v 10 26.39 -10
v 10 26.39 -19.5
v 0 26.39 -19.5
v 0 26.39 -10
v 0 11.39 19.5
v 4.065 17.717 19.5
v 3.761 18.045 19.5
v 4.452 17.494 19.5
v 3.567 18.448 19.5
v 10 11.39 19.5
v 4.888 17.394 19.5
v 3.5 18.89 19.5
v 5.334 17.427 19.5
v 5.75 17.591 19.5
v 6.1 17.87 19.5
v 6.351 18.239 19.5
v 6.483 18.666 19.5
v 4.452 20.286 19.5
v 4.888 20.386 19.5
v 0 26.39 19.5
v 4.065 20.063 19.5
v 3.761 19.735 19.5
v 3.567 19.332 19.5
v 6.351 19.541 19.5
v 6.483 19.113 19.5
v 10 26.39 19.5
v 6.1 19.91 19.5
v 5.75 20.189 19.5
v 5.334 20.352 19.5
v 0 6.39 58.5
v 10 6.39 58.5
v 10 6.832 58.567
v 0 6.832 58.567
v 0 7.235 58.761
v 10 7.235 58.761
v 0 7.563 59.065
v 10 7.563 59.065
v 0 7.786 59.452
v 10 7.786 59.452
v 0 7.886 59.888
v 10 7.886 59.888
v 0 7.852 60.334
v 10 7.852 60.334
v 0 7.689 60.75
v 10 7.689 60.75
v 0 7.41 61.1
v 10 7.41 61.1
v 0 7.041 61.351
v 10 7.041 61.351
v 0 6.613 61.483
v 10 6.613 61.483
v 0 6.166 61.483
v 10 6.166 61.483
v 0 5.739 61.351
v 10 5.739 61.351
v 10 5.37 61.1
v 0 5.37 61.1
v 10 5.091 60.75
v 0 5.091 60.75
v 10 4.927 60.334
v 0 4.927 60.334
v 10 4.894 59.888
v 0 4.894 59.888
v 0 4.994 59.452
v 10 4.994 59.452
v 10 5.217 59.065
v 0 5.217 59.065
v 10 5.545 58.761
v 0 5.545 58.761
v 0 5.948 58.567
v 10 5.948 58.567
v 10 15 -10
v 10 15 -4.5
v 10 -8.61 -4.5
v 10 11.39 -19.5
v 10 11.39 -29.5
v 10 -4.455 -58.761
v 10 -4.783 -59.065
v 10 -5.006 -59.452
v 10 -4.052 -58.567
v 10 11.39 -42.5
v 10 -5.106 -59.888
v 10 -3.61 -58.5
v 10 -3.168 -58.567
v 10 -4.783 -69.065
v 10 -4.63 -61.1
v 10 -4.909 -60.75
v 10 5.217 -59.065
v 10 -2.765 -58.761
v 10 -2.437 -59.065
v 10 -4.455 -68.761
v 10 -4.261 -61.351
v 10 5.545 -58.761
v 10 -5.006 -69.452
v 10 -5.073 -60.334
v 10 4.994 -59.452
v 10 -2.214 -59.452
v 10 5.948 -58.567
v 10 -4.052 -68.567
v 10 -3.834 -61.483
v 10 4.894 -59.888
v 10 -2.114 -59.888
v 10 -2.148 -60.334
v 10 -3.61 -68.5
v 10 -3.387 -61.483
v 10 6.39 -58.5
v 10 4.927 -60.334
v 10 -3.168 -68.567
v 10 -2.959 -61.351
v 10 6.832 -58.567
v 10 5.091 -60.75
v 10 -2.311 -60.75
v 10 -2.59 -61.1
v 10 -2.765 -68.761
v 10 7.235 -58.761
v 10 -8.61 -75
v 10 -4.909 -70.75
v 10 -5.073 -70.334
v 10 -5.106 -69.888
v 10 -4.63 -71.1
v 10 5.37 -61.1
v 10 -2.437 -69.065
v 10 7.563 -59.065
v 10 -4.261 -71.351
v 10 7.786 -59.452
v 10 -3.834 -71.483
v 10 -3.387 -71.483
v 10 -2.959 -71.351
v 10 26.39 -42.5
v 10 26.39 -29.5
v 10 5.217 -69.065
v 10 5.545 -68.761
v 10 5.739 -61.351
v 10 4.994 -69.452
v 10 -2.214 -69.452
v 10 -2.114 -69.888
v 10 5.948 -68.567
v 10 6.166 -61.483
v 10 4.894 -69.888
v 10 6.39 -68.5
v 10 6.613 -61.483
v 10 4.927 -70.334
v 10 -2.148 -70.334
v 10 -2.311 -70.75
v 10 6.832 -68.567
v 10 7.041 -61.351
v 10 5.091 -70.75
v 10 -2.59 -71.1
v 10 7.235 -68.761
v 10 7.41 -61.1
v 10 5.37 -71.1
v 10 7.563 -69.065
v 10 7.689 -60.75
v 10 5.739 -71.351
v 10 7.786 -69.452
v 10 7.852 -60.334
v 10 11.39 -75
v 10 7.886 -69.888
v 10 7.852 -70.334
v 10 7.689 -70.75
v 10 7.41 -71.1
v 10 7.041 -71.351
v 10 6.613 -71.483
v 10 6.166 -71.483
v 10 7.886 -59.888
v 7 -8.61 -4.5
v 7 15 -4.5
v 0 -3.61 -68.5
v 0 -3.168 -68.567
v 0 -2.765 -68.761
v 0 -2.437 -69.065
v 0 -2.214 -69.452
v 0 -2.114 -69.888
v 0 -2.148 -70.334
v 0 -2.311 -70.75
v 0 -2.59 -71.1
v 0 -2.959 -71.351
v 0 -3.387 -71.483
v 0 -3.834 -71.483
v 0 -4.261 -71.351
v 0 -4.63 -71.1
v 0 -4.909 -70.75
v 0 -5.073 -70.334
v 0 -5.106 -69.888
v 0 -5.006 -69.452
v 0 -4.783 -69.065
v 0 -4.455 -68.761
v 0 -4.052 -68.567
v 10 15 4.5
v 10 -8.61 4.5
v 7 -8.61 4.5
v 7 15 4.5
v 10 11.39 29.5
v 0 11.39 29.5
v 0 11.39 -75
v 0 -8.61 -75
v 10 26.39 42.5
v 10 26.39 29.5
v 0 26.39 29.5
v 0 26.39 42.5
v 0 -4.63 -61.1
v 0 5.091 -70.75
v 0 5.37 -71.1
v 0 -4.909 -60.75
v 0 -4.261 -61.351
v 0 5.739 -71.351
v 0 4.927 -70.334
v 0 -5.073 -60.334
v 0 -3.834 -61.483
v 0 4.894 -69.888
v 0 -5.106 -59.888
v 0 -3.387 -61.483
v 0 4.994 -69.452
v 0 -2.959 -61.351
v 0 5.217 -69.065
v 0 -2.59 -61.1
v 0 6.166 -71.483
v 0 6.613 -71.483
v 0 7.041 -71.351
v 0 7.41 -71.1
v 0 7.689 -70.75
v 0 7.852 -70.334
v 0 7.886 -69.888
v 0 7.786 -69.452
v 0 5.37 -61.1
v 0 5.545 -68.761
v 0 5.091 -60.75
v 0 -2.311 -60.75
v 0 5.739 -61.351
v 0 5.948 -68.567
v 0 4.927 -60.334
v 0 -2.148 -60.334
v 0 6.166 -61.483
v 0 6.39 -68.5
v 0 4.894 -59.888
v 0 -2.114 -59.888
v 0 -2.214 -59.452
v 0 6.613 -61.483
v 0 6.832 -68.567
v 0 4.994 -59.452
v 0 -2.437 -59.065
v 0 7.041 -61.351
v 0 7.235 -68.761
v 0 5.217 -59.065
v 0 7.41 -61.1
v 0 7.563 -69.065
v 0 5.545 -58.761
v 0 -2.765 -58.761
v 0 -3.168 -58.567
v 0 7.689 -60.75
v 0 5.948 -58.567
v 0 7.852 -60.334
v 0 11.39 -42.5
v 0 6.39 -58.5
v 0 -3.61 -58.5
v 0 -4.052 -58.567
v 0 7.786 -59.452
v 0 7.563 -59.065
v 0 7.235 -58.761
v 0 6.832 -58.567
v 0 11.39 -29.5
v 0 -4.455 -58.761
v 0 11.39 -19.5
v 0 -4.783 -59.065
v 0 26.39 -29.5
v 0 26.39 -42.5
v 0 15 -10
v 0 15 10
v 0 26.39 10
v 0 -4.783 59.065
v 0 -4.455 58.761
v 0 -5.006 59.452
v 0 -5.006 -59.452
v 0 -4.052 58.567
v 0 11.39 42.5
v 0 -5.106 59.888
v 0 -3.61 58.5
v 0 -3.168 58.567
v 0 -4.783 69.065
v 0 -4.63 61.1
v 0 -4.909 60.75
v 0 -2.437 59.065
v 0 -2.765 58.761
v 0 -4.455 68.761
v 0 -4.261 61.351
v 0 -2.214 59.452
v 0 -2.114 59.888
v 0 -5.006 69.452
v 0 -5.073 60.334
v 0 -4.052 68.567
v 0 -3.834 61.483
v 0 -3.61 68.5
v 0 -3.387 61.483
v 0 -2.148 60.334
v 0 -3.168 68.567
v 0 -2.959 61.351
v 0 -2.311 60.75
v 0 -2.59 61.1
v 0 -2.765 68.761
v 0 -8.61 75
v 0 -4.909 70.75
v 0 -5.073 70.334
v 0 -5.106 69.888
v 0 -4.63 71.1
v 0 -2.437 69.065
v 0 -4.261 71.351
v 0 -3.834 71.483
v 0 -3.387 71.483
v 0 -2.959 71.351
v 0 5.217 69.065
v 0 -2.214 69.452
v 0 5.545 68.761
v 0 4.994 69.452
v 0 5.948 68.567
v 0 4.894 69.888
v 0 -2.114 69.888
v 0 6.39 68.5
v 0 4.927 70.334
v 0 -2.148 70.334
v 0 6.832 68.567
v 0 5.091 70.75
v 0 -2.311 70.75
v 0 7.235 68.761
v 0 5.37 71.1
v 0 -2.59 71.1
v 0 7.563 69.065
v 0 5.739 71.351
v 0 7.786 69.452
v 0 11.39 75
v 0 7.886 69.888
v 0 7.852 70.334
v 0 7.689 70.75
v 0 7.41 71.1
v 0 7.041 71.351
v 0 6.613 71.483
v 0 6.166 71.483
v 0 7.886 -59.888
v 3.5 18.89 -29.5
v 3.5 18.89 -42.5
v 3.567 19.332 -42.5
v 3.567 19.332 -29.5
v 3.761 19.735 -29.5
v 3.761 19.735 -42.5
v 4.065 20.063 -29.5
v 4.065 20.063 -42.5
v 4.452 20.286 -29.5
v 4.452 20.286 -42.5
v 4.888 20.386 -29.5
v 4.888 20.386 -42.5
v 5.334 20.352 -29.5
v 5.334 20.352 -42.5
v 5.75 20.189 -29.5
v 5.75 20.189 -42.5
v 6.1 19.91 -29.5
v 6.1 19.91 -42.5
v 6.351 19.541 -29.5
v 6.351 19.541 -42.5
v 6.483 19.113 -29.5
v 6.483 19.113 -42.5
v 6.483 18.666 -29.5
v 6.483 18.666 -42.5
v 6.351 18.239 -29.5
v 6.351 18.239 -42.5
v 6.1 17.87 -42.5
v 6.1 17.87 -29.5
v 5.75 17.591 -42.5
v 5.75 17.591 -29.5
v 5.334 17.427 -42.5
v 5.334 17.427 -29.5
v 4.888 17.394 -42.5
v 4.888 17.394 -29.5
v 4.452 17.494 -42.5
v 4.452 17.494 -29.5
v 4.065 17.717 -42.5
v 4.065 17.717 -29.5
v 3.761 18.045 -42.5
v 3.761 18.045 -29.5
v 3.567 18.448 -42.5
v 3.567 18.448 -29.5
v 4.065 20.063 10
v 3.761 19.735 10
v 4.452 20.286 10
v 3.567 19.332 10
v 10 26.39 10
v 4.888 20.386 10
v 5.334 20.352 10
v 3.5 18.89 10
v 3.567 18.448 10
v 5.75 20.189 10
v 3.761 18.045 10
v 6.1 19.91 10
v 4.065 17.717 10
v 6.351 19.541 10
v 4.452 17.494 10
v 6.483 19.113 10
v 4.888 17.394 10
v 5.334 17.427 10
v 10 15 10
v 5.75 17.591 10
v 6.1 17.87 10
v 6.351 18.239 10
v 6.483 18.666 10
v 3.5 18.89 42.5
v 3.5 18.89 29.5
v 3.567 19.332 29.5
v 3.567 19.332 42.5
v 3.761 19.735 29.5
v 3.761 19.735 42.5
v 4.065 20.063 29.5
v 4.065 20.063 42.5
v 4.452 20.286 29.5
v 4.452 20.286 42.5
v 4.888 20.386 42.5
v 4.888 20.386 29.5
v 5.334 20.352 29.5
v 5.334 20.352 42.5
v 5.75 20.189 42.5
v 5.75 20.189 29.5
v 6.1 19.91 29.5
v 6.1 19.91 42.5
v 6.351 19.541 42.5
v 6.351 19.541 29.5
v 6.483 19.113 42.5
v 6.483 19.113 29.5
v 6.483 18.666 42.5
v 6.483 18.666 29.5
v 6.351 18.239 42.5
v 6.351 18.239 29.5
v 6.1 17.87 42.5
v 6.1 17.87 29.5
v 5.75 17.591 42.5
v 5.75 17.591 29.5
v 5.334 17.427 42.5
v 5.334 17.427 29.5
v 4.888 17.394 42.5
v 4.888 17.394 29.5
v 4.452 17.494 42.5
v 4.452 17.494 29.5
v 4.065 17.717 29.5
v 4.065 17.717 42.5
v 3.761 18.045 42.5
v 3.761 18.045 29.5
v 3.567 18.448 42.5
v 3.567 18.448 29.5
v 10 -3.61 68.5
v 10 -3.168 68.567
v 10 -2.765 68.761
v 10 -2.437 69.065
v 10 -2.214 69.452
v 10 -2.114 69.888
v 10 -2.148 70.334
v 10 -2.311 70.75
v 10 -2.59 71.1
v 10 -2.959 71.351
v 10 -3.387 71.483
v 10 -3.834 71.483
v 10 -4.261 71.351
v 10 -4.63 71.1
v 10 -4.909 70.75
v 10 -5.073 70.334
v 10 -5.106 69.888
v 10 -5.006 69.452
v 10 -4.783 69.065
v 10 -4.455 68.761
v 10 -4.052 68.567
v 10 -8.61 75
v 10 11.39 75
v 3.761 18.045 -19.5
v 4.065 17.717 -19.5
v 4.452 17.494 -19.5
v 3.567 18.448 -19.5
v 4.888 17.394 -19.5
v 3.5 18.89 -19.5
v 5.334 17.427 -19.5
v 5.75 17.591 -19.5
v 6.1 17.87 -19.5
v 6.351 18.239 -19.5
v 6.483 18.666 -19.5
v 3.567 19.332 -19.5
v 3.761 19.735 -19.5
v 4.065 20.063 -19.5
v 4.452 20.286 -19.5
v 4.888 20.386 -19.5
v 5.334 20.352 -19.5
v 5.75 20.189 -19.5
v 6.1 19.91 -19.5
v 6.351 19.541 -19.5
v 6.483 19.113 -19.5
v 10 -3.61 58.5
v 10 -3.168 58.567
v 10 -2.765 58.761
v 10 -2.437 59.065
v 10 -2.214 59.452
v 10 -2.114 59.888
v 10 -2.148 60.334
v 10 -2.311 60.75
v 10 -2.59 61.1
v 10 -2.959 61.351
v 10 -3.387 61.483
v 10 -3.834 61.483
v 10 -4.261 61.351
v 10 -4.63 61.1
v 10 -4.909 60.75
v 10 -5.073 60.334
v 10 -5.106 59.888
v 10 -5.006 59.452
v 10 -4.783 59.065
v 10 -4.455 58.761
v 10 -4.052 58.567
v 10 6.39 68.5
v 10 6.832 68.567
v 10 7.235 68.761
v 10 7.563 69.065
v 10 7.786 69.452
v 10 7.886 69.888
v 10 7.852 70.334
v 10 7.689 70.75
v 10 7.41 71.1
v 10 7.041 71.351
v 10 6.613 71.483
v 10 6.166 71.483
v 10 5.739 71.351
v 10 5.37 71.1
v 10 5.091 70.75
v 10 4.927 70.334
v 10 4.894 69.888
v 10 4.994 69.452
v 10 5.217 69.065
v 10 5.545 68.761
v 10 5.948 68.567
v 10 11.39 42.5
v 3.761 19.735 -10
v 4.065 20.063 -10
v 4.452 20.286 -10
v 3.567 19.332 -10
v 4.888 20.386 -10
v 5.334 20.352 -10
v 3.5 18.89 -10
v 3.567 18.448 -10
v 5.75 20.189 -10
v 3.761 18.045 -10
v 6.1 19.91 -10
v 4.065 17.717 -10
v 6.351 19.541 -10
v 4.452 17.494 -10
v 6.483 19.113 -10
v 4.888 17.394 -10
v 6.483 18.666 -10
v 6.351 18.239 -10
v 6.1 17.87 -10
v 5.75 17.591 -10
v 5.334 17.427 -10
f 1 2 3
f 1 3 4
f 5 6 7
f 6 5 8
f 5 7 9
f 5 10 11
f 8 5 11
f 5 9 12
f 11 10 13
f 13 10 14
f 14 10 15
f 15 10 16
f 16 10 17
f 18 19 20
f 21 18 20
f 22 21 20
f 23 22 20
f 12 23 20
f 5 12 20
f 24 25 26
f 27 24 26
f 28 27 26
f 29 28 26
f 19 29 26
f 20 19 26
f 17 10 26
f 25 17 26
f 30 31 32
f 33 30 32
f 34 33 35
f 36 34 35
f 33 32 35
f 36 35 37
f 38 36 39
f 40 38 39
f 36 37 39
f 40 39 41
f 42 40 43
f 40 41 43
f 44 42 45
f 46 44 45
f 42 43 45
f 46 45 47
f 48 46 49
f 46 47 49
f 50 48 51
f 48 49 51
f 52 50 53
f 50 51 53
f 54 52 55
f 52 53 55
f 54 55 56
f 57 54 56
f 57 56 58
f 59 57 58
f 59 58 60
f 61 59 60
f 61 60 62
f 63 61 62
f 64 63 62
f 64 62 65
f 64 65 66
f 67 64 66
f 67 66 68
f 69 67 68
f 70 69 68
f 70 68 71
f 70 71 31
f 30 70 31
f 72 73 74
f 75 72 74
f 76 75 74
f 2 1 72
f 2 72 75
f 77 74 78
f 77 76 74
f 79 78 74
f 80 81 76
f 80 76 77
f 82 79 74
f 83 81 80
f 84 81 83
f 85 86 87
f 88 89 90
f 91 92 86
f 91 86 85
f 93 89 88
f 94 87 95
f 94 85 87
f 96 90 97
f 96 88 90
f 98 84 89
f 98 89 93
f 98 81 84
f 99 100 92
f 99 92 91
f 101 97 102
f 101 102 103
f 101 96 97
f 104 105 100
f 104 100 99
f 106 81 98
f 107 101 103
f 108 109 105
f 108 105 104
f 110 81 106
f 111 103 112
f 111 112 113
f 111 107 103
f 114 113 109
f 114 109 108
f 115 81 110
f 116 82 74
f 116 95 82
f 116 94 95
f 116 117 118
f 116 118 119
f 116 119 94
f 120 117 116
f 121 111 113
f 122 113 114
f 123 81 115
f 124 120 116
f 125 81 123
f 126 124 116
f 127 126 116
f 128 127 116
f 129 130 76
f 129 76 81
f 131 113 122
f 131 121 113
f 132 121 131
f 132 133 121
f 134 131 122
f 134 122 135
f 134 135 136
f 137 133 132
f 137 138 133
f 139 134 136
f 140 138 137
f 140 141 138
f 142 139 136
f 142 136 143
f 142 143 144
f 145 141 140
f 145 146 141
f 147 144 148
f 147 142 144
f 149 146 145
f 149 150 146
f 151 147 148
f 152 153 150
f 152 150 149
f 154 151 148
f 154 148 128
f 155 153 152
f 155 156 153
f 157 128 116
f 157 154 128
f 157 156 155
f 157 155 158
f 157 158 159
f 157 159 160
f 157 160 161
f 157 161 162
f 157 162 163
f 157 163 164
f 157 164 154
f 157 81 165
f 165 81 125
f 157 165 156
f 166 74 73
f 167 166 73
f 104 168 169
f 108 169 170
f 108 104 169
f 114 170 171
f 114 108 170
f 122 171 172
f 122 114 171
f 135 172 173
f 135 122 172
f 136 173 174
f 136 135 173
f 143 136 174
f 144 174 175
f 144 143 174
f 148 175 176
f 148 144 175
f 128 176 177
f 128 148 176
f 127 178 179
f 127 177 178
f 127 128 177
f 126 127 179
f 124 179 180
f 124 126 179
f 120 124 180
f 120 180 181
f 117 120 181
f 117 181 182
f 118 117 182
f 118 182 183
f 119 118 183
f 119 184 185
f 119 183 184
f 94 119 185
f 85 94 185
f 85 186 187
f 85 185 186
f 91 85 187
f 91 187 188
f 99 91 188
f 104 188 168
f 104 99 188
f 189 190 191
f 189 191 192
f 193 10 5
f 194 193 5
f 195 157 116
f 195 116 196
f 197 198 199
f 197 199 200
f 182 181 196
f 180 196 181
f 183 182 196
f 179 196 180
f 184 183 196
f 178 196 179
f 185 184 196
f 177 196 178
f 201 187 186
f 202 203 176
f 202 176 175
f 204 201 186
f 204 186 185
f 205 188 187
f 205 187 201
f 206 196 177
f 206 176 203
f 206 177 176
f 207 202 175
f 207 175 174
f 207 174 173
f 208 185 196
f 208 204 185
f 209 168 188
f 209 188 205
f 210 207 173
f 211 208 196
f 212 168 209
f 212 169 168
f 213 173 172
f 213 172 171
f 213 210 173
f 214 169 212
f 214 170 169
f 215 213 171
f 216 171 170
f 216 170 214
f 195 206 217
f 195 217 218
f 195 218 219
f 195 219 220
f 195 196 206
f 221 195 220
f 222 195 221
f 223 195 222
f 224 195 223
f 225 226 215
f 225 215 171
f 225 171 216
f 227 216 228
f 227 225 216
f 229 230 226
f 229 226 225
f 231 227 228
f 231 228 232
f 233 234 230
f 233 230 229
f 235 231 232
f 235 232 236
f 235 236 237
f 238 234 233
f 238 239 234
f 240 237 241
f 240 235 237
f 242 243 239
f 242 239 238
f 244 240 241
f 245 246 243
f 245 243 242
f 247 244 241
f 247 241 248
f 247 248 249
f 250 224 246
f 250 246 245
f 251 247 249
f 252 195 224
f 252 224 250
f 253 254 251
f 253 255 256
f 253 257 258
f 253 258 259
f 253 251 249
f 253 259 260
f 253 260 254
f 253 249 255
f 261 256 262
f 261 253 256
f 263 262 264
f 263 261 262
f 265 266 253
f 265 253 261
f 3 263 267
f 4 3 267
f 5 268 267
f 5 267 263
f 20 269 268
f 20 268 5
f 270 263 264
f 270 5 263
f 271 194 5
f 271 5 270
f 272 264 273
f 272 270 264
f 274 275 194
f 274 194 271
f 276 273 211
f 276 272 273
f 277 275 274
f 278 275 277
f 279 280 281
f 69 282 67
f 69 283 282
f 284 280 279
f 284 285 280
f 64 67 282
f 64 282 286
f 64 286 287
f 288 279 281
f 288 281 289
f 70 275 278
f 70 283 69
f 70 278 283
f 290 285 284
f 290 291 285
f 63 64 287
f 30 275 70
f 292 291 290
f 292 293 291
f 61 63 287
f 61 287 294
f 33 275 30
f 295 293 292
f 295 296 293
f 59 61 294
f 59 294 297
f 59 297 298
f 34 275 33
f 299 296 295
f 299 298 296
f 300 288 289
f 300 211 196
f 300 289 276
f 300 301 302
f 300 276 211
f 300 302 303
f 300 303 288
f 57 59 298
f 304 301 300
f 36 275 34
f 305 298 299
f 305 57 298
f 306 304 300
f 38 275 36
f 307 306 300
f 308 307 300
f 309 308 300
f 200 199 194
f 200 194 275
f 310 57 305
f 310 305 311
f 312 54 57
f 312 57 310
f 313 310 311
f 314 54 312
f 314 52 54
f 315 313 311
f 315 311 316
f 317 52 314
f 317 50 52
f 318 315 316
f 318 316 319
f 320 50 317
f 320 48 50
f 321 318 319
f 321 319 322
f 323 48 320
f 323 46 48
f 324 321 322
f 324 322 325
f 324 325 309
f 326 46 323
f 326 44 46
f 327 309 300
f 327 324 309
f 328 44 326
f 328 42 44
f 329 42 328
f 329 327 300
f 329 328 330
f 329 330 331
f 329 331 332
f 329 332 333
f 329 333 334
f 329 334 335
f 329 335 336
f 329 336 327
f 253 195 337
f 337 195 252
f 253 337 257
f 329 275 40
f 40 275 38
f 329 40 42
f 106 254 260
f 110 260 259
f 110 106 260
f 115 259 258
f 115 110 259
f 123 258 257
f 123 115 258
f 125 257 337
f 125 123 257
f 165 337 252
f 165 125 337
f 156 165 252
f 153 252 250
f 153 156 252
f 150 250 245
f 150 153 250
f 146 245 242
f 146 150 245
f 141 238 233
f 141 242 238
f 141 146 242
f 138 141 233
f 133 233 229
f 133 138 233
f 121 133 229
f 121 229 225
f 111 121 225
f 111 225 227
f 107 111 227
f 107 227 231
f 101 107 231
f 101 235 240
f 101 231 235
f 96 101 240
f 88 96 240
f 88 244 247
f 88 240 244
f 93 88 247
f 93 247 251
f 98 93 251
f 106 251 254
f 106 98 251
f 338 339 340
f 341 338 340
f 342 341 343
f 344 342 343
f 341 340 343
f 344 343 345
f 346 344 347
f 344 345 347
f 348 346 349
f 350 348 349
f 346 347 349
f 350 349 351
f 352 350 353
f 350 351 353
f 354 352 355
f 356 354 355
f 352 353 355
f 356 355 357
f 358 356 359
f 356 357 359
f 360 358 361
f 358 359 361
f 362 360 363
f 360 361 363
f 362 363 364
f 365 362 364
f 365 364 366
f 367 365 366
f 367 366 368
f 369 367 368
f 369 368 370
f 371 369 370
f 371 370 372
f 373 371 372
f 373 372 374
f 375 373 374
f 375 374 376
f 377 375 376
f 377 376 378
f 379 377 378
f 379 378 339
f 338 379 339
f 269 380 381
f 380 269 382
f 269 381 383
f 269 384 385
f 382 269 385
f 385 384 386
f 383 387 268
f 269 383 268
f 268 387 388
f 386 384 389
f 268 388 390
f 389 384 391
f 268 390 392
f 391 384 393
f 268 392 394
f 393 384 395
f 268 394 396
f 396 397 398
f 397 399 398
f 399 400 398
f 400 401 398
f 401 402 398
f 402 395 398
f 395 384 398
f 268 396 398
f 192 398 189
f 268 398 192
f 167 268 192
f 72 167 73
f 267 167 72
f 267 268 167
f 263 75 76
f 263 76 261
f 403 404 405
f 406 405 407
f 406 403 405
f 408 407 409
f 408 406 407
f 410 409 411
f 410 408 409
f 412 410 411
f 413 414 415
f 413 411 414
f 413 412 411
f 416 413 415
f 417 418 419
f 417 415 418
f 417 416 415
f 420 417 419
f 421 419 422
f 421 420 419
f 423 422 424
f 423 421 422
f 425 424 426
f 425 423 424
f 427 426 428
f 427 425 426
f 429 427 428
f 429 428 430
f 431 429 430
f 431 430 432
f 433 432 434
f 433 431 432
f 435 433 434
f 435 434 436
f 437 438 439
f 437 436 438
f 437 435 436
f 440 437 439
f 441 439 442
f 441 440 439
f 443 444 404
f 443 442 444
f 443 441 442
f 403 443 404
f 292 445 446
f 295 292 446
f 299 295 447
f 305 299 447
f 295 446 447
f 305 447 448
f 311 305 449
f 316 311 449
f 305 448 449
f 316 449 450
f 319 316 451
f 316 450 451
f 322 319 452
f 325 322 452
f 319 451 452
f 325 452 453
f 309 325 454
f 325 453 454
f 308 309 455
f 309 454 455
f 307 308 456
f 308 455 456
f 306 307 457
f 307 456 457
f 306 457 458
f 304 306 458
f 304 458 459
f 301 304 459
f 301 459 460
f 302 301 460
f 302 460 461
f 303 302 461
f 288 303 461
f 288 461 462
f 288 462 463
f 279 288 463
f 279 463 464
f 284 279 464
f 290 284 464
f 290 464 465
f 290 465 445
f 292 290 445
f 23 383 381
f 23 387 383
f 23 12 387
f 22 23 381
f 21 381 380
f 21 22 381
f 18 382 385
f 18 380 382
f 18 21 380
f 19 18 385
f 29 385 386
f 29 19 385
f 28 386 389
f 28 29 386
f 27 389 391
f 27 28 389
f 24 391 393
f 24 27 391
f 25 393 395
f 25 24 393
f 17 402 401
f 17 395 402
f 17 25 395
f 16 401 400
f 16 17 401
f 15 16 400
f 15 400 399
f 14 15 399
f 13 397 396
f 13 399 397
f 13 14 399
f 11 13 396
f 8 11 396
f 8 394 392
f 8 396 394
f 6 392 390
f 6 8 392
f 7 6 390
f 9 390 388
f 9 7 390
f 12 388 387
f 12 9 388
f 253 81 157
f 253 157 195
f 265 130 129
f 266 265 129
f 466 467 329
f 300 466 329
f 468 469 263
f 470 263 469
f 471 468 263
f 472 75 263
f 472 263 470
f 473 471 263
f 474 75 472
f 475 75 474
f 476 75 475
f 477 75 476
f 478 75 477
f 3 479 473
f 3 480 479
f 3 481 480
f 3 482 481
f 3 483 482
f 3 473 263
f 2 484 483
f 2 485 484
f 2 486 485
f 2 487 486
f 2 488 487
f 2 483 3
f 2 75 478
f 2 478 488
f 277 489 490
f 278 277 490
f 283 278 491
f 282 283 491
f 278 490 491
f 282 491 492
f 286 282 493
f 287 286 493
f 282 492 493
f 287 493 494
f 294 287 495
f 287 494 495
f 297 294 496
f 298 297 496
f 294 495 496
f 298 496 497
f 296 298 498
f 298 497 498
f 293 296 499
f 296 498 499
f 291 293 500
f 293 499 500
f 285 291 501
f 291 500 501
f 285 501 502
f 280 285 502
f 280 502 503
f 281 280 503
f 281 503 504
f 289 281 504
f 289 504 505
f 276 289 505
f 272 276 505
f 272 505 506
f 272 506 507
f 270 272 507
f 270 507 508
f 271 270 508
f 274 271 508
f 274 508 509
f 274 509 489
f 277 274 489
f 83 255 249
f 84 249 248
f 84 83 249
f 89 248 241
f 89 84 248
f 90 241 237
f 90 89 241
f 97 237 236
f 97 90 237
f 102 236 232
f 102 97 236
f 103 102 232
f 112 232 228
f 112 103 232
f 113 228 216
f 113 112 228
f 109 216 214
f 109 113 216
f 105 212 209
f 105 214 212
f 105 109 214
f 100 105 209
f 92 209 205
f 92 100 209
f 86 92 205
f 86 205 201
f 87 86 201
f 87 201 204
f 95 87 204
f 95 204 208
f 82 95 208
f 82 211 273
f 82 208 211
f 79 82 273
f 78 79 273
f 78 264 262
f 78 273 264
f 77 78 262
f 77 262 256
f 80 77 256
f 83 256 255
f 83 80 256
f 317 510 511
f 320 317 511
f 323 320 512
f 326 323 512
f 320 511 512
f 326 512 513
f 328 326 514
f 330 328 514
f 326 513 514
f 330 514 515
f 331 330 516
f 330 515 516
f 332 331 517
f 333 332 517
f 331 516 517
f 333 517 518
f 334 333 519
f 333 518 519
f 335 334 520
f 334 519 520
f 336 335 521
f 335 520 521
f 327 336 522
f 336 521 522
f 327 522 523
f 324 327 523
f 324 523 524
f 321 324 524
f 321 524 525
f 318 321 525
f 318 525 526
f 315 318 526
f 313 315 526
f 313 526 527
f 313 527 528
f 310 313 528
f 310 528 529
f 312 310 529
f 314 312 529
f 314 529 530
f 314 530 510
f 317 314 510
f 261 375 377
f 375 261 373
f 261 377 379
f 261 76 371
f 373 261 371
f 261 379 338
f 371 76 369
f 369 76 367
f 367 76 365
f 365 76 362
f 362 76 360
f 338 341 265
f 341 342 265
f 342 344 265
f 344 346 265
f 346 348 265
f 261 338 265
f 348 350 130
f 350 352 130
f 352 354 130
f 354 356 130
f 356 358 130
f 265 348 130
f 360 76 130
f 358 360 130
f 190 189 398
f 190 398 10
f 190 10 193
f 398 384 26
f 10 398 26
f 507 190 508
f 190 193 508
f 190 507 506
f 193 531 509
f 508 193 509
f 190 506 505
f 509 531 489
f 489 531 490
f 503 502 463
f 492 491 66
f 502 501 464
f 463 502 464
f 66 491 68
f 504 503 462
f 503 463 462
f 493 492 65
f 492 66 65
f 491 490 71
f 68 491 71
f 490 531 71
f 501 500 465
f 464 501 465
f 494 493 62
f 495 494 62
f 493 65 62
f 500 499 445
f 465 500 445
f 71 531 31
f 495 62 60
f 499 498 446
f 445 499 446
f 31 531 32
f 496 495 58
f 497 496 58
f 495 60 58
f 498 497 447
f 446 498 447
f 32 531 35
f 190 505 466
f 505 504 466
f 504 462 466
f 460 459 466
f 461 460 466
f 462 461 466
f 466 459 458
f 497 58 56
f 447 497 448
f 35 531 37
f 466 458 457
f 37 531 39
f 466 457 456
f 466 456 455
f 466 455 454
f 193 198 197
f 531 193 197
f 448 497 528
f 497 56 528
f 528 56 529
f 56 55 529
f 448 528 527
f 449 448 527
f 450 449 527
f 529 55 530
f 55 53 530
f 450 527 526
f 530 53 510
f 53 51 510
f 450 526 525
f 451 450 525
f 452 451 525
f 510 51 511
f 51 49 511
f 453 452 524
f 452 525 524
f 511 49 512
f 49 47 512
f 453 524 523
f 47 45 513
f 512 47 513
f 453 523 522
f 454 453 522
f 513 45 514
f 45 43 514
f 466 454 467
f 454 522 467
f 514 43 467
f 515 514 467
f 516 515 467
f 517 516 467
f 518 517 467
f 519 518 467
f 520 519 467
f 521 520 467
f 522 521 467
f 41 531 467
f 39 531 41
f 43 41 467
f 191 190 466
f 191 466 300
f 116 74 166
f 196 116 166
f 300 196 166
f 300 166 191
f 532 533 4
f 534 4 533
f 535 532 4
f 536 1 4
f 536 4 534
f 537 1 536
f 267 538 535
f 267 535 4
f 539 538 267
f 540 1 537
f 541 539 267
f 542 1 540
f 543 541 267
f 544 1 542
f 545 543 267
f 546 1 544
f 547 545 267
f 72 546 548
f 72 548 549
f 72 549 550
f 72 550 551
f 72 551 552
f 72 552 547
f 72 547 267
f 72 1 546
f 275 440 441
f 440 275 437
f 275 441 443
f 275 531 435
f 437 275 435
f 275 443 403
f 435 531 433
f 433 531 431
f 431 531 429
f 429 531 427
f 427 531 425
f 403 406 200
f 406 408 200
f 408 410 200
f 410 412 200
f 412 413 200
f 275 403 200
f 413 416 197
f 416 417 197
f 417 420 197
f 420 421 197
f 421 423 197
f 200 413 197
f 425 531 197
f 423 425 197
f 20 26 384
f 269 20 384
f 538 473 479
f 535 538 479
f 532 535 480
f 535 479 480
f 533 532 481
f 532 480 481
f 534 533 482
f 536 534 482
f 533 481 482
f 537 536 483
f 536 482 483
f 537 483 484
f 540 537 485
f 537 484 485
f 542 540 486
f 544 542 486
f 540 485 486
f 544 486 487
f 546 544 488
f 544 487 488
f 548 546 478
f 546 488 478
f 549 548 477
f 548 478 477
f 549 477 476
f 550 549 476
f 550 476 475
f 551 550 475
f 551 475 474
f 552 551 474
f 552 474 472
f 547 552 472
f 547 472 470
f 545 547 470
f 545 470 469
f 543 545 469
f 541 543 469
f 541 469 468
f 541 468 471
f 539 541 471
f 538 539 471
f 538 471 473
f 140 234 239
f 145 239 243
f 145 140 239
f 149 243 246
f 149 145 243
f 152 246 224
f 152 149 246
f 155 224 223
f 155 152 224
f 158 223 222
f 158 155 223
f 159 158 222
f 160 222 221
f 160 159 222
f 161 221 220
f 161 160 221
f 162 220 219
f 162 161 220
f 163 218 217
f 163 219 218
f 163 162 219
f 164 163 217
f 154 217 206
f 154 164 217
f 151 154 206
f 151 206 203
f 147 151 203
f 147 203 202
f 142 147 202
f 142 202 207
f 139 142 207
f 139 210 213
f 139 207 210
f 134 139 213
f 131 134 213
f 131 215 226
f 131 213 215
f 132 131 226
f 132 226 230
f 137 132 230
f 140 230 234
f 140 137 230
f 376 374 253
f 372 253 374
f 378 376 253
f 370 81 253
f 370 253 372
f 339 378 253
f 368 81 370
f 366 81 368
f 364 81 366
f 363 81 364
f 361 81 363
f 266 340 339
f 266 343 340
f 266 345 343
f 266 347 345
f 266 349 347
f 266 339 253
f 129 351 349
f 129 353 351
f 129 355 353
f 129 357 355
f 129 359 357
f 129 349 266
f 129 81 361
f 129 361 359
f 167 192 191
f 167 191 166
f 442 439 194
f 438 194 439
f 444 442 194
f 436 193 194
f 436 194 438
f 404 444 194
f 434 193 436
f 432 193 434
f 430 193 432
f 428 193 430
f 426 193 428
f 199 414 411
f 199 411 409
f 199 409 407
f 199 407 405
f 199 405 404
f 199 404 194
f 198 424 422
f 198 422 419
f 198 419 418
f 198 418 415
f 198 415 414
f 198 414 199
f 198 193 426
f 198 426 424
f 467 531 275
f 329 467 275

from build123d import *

# Parameters (mm, degrees)
SKETCH_1_W          = 20
SKETCH_1_H          = 30
EXTRUDE_1_DEPTH     = 10
SKETCH_3_W          = 10
SKETCH_3_H          = 20
EXTRUDE_2_DEPTH     = 65
SKETCH_4_R          = 1.5
CUT_EXTRUDE_1_DEPTH = 78.136243103
SKETCH_5_W          = 9
SKETCH_5_H          = 30
CUT_EXTRUDE_2_DEPTH = 3
SKETCH_6_W          = 13
SKETCH_6_H          = 15
EXTRUDE_3_DEPTH     = 10
SKETCH_7_R          = 1.5
CUT_EXTRUDE_5_DEPTH = 121.841532616
SKETCH_8_W          = 20
SKETCH_8_H          = 20
CUT_EXTRUDE_6_DEPTH = 6.389884519


with BuildPart() as part:
    # 草图1 → 凸台-拉伸1 (new body)
    with BuildSketch(Plane(origin=(0, 0, 0), x_dir=(0, 0, -1), z_dir=(1, 0, 0))):
        Rectangle(SKETCH_1_W, SKETCH_1_H)
    extrude(amount=EXTRUDE_1_DEPTH)

    # 草图3 → 凸台-拉伸2 (add)
    with BuildSketch(Plane(origin=(0, 0, -10), x_dir=(-1, 0, 0), z_dir=(0, 0, -1))):
        with Locations((-5, 1.389884519)):
            Rectangle(SKETCH_3_W, SKETCH_3_H)
    extrude_2 = extrude(amount=EXTRUDE_2_DEPTH)

    # 镜向1: 凸台-拉伸2 across plane
    add(extrude_2.mirror(Plane.XY))

    # 草图4 → 切除-拉伸1 (cut, through all)
    with BuildSketch(Plane(origin=(10, 0, 0), x_dir=(0, 0, -1), z_dir=(1, 0, 0))):
        with Locations((-70, 6.389884519)):
            Circle(SKETCH_4_R)
        with Locations((-60, 6.389884519)):
            Circle(SKETCH_4_R)
        with Locations((-70, -3.610115481)):
            Circle(SKETCH_4_R)
        with Locations((-60, -3.610115481)):
            Circle(SKETCH_4_R)
    cut_extrude_1 = extrude(amount=-CUT_EXTRUDE_1_DEPTH, mode=Mode.SUBTRACT)

    # 镜向2: 切除-拉伸1 across plane
    add(cut_extrude_1.mirror(Plane.XY), mode=Mode.SUBTRACT)

    # 草图5 → 切除-拉伸2 (cut)
    with BuildSketch(Plane(origin=(10, 0, 0), x_dir=(0, 0, -1), z_dir=(1, 0, 0))):
        Rectangle(SKETCH_5_W, SKETCH_5_H)
    extrude(amount=-CUT_EXTRUDE_2_DEPTH, mode=Mode.SUBTRACT)

    # 草图6 → 凸台-拉伸3 (add)
    with BuildSketch(Plane(origin=(10, 0, 0), x_dir=(0, 0, -1), z_dir=(1, 0, 0))):
        with Locations((36, 18.889884519)):
            Rectangle(SKETCH_6_W, SKETCH_6_H)
        Polygon((10, 11.389884519), (19.5, 11.389884519), (19.5, 26.389884519), (10, 26.389884519), (10, 15), align=None)
    extrude_3 = extrude(amount=-EXTRUDE_3_DEPTH)

    # 草图7 → 切除-拉伸5 (cut, through all)
    with BuildSketch(Plane(origin=(0, 0, -42.5), x_dir=(-1, 0, 0), z_dir=(0, 0, -1))):
        with Locations((-5, 18.889884519)):
            Circle(SKETCH_7_R)
    cut_extrude_5 = extrude(amount=-CUT_EXTRUDE_5_DEPTH, mode=Mode.SUBTRACT)

    # 镜向4: 凸台-拉伸3, 切除-拉伸5 across plane
    add(extrude_3.mirror(Plane.XY))
    add(cut_extrude_5.mirror(Plane.XY), mode=Mode.SUBTRACT)

    # 草图8 → 切除-拉伸6 (cut)
    with BuildSketch(Plane.XZ.offset(15)):
        Rectangle(SKETCH_8_W, SKETCH_8_H)
    extrude(amount=-CUT_EXTRUDE_6_DEPTH, mode=Mode.SUBTRACT)


solid = part.part
